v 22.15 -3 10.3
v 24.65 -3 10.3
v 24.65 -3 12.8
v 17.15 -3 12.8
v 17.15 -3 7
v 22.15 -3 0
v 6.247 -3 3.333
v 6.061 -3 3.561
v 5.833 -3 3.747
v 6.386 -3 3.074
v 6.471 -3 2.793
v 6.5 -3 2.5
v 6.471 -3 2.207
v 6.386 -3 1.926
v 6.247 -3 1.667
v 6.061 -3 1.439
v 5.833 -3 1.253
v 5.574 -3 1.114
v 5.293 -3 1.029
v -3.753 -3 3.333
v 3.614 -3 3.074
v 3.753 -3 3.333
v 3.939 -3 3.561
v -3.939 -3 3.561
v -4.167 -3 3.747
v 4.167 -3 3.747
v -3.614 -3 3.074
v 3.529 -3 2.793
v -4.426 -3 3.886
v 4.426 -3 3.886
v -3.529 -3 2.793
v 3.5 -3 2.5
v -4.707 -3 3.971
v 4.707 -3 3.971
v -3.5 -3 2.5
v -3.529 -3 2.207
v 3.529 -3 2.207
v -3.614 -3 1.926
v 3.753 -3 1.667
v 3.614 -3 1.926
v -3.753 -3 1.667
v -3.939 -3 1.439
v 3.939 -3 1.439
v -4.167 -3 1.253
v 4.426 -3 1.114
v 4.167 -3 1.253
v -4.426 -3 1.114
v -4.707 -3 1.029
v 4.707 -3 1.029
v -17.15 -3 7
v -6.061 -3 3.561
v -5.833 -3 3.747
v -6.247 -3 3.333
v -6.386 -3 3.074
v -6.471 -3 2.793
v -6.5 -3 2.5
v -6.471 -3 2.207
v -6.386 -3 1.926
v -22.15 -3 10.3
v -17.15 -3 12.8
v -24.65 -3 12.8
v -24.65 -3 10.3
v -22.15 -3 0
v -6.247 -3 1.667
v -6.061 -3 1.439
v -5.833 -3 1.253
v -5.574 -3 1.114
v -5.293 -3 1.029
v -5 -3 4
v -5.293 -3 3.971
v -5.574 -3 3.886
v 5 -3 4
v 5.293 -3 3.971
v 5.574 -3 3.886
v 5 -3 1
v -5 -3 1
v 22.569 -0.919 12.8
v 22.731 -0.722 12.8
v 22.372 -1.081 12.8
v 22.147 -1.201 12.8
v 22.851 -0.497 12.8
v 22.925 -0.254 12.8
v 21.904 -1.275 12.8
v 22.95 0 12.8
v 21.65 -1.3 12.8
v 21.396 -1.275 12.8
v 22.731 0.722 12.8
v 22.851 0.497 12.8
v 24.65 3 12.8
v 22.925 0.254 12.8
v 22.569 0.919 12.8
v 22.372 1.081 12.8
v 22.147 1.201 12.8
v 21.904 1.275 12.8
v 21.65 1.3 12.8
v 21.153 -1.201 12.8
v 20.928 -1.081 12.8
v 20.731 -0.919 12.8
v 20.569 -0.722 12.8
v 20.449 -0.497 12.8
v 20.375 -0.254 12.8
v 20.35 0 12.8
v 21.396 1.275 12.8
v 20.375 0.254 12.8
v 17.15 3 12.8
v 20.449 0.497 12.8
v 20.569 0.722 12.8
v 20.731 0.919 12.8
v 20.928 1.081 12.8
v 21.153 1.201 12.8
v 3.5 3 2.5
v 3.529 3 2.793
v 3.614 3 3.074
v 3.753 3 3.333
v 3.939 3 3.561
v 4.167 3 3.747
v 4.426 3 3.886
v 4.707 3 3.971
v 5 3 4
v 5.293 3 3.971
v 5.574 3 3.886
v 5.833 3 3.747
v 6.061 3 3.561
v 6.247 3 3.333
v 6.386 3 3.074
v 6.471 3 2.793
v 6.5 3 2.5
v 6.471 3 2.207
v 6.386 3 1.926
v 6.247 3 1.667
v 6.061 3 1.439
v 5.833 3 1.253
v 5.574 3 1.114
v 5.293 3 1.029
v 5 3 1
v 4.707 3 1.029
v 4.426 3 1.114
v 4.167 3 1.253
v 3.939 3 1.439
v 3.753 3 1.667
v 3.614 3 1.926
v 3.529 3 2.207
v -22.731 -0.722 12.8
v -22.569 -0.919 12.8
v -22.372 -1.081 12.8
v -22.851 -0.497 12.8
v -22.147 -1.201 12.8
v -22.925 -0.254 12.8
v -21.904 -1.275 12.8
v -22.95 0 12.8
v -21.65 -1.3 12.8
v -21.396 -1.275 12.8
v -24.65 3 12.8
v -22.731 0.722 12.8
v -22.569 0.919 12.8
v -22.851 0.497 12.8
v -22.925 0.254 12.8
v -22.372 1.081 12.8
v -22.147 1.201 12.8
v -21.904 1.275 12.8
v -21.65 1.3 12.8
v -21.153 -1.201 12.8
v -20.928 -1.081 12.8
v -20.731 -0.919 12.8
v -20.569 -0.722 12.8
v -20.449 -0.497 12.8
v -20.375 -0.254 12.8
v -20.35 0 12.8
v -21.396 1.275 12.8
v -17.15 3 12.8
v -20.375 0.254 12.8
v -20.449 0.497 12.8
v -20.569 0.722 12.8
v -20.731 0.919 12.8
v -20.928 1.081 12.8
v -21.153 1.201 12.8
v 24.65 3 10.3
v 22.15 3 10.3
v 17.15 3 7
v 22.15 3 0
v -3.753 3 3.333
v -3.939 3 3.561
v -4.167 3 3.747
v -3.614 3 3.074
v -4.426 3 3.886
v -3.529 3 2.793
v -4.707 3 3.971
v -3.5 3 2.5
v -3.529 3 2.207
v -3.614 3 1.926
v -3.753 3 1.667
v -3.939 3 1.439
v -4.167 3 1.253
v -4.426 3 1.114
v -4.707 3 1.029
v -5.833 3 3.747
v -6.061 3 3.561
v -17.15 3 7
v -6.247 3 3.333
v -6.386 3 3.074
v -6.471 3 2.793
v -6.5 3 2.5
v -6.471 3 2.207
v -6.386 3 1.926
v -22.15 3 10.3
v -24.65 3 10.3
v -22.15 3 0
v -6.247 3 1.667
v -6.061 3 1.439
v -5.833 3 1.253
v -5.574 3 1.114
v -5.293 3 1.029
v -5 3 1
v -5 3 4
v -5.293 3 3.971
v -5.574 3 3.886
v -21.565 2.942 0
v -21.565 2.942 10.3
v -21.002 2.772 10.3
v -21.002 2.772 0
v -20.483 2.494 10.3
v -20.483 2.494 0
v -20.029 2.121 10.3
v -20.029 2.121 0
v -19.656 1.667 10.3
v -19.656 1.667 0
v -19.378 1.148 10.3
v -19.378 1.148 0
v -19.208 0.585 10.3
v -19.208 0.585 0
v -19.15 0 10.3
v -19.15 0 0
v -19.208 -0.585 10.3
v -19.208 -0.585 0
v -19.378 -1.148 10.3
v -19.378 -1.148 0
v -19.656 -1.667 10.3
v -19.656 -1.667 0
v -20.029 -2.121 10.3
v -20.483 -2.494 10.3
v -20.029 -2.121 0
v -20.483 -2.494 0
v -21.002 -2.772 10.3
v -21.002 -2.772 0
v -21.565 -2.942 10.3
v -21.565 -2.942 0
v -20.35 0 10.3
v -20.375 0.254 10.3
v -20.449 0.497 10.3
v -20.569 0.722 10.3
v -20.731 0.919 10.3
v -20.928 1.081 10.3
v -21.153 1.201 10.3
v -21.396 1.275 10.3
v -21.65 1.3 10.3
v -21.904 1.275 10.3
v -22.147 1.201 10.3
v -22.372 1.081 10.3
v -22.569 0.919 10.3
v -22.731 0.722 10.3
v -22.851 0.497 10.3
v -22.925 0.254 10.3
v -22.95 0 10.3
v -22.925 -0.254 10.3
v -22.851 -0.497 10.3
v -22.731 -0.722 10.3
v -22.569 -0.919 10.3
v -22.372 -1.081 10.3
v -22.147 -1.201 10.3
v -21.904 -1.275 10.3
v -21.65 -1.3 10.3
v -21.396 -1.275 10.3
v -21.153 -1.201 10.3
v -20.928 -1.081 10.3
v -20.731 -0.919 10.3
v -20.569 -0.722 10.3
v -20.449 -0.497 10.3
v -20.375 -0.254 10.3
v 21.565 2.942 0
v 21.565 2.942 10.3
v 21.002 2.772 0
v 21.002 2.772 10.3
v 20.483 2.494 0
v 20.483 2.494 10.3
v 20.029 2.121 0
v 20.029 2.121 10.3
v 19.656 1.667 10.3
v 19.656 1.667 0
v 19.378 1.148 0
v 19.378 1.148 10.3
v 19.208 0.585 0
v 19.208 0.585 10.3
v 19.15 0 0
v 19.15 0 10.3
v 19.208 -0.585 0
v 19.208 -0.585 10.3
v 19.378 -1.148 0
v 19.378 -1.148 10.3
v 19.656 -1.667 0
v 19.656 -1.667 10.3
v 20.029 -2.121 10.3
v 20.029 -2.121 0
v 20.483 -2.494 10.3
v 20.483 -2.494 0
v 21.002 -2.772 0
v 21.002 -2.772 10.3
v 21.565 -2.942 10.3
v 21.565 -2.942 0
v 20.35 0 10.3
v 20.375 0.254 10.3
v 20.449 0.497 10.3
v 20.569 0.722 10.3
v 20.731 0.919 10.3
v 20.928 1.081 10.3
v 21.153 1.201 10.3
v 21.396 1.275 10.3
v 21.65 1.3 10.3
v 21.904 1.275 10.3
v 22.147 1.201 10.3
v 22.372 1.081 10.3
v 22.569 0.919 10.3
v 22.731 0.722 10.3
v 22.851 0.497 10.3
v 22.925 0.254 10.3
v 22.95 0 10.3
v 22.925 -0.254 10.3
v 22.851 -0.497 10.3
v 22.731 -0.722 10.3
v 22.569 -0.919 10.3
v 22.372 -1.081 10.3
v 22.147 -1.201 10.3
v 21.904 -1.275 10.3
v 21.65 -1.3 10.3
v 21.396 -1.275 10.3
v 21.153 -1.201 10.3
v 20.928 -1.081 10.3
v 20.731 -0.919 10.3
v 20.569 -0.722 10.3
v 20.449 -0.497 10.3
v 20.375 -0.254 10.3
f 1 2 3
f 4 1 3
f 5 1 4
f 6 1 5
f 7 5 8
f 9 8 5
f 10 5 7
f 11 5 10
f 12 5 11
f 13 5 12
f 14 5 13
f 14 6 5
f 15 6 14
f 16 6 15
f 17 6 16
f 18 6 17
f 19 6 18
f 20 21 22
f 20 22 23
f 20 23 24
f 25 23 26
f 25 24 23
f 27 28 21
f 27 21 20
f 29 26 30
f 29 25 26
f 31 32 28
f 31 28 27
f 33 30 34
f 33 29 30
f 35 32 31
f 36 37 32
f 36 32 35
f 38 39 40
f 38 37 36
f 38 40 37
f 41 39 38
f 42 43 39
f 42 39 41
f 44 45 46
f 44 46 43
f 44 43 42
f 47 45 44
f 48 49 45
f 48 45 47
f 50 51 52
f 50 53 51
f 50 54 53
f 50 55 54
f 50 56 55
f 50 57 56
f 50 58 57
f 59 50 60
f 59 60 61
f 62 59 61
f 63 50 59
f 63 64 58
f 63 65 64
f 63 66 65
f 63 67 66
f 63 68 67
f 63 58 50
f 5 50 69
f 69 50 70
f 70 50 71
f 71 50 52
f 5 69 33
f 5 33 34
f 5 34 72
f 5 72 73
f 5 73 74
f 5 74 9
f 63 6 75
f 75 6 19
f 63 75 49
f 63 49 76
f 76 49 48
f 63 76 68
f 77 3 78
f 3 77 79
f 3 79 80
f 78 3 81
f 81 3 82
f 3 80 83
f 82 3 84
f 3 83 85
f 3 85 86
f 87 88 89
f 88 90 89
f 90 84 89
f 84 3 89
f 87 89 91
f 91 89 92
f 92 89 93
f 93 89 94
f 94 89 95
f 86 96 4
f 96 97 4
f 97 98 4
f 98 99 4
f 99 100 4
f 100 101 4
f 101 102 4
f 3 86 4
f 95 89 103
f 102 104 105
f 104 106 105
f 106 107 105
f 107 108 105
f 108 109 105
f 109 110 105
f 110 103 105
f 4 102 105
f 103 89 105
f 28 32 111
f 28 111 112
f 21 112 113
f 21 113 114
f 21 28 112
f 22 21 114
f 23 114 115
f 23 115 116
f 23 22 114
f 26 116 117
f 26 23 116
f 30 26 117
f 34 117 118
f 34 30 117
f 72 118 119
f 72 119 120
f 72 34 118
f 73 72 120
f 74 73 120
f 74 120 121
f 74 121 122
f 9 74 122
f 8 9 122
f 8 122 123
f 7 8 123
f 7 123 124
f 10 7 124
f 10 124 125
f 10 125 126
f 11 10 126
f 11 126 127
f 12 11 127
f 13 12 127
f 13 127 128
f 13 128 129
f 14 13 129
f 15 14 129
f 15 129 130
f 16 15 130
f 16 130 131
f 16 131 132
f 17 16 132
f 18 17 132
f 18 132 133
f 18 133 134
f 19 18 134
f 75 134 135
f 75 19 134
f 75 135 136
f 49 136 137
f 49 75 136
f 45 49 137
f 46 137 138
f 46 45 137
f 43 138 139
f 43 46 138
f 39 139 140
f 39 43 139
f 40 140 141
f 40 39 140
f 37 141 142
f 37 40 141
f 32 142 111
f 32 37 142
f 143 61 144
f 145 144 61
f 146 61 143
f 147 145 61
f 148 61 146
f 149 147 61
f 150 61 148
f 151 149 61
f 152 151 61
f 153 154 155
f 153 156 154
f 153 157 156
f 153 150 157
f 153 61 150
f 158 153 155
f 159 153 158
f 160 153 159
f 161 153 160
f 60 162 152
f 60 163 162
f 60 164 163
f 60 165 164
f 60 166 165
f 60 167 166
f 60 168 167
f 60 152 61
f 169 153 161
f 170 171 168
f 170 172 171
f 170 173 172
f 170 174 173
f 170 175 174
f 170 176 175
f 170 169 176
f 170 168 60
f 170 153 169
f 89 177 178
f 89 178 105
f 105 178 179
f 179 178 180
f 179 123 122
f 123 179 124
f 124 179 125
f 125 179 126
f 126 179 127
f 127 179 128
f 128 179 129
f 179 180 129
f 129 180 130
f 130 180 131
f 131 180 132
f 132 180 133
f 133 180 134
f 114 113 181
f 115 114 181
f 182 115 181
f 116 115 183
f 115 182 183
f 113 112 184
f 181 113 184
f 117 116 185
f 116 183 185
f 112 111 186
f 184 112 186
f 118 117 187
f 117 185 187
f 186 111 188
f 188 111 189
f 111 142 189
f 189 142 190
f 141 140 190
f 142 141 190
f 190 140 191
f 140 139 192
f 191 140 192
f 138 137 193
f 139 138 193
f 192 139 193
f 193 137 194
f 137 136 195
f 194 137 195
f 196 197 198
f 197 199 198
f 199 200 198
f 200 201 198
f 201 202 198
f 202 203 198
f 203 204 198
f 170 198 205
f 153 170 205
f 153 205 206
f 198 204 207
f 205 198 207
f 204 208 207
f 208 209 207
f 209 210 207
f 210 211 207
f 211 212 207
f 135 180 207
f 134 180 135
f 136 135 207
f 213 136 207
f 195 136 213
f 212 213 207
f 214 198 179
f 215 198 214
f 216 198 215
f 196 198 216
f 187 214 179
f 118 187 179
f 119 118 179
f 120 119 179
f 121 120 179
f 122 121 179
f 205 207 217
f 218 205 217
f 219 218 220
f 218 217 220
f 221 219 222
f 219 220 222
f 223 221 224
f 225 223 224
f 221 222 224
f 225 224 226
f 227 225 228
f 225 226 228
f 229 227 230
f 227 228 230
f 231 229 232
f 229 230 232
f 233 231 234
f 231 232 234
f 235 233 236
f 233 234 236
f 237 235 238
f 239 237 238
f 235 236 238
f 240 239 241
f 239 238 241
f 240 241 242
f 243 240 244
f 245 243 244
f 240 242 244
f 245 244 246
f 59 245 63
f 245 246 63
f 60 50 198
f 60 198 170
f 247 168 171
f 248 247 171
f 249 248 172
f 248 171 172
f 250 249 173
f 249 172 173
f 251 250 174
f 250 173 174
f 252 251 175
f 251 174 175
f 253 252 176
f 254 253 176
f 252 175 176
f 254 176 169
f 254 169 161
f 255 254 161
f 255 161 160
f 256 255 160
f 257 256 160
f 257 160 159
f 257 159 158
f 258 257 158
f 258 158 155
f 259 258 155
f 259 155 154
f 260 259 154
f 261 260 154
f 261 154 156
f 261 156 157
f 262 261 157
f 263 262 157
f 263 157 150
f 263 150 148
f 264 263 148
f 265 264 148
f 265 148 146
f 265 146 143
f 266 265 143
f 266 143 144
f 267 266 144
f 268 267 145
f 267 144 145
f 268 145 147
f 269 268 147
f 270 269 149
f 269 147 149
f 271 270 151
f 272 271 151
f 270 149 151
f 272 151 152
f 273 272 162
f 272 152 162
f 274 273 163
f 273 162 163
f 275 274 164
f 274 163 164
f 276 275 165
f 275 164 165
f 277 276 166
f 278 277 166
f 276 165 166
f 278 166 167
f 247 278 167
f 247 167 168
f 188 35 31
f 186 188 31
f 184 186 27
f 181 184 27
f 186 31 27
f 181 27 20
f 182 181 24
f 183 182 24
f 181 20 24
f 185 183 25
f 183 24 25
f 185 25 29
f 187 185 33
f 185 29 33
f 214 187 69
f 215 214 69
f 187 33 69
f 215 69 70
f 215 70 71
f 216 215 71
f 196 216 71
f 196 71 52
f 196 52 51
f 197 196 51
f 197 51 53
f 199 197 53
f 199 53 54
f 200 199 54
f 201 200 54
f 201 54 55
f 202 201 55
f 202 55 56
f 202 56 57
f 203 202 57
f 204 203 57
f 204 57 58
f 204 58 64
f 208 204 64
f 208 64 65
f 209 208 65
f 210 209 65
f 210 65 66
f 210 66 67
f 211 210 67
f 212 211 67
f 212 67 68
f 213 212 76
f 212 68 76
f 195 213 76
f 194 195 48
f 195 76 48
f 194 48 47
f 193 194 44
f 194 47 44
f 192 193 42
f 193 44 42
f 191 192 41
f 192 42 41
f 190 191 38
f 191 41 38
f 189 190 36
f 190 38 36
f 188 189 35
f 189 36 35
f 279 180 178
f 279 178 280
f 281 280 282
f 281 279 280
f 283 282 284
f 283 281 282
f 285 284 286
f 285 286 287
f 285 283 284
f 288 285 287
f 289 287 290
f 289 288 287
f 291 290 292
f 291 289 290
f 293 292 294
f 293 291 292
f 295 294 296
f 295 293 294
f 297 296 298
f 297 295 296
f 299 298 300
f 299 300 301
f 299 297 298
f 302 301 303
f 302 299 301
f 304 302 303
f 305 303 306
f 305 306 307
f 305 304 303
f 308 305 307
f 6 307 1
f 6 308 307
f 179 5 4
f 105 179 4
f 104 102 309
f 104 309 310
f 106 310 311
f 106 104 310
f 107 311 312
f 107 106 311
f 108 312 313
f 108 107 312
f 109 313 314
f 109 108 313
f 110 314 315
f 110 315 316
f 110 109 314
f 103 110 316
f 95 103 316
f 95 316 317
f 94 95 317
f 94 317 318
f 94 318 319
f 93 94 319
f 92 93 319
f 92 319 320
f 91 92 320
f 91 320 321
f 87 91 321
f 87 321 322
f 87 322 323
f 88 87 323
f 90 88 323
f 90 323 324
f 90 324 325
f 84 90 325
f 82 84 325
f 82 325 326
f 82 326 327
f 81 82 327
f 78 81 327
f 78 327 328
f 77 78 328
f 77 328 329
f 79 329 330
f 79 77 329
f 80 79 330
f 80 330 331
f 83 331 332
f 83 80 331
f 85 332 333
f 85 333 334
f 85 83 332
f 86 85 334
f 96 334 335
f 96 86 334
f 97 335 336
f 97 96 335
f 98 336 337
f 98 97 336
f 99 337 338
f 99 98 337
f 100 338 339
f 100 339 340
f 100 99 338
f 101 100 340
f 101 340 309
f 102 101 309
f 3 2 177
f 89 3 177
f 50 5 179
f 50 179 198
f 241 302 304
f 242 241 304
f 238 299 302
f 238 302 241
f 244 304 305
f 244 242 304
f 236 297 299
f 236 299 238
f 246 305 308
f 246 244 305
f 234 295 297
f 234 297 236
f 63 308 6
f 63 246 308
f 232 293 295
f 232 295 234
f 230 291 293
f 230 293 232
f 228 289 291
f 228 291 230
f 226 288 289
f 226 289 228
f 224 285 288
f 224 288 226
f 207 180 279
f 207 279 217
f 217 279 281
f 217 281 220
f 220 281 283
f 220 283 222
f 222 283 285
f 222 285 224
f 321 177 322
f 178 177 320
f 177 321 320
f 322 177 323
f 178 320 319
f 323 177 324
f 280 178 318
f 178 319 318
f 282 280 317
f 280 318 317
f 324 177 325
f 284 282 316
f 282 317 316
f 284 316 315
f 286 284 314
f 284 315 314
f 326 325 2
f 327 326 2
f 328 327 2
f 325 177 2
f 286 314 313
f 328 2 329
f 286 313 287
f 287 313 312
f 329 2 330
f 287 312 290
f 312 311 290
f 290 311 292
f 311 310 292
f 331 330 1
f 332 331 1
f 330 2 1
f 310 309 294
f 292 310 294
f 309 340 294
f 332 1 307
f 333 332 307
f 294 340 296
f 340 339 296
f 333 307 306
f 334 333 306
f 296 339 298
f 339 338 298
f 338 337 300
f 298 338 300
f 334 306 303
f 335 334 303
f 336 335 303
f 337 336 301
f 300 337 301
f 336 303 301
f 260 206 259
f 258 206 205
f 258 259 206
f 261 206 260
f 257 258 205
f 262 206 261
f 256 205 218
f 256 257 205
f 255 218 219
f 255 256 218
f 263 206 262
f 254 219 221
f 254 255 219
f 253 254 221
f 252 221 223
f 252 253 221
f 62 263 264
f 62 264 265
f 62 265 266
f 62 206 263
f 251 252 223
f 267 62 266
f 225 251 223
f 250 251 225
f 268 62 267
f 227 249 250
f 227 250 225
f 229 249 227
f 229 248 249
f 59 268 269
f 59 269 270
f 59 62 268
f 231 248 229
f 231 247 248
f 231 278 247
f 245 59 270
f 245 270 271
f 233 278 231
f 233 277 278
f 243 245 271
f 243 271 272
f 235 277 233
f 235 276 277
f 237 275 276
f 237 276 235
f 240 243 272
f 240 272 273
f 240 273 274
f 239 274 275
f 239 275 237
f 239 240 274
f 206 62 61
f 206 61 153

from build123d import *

# Parameters (mm, degrees)
F0_W     = 24.65
F0_H     = 6
F1_DEPTH = 12.8
F2_W     = 17.15
F2_H     = 5.8
F3_DEPTH = 25
F6_DEPTH = 10.3
F4_R     = 1.3
F7_DEPTH = 25
F8_R     = 1.5
F9_DEPTH = 25


with BuildPart() as f1:
    # F0 (on Top) → F1 (new body)
    with BuildSketch(Plane.XY):
        with Locations((-12.325, 0)):
            Rectangle(F0_W, F0_H)
    extrude(amount=F1_DEPTH)

    # F2 (on face) → F3 (cut)
    with BuildSketch(Plane.XZ.offset(3)):
        with Locations((-8.575, 9.9)):
            Rectangle(F2_W, F2_H)
    extrude(amount=-F3_DEPTH, mode=Mode.SUBTRACT)

    # F5 (on face) → F6 (cut)
    with BuildSketch(Plane(origin=(0, 0, 0), x_dir=(1, 0, 0), z_dir=(0, 0, -1))):
        with BuildLine():
            Line((-24.65, -3), (-22.15, -3))
            ThreePointArc((-22.15, -3), (-19.15, 0), (-22.15, 3))
            Line((-22.15, 3), (-24.65, 3))
            Line((-24.65, 3), (-24.65, -3))
        make_face()
    extrude(amount=-F6_DEPTH, mode=Mode.SUBTRACT)

    # F4 (on face) → F7 (cut)
    with BuildSketch(Plane.XY.offset(12.8)):
        with Locations((-21.65, 0)):
            Circle(F4_R)
    extrude(amount=-F7_DEPTH, mode=Mode.SUBTRACT)

    # F8 (on face) → F9 (cut)
    with BuildSketch(Plane.XZ.offset(3)):
        with Locations((-5, 2.5)):
            Circle(F8_R)
    extrude(amount=-F9_DEPTH, mode=Mode.SUBTRACT)

    # F10: F1 across face


with BuildPart() as f1_1:
    add(f1.part)
    add(f1.part.mirror(Plane(origin=(0, 0, 3.5), x_dir=(0, 1, 0), z_dir=(1, 0, 0))))


solid = f1_1.part
